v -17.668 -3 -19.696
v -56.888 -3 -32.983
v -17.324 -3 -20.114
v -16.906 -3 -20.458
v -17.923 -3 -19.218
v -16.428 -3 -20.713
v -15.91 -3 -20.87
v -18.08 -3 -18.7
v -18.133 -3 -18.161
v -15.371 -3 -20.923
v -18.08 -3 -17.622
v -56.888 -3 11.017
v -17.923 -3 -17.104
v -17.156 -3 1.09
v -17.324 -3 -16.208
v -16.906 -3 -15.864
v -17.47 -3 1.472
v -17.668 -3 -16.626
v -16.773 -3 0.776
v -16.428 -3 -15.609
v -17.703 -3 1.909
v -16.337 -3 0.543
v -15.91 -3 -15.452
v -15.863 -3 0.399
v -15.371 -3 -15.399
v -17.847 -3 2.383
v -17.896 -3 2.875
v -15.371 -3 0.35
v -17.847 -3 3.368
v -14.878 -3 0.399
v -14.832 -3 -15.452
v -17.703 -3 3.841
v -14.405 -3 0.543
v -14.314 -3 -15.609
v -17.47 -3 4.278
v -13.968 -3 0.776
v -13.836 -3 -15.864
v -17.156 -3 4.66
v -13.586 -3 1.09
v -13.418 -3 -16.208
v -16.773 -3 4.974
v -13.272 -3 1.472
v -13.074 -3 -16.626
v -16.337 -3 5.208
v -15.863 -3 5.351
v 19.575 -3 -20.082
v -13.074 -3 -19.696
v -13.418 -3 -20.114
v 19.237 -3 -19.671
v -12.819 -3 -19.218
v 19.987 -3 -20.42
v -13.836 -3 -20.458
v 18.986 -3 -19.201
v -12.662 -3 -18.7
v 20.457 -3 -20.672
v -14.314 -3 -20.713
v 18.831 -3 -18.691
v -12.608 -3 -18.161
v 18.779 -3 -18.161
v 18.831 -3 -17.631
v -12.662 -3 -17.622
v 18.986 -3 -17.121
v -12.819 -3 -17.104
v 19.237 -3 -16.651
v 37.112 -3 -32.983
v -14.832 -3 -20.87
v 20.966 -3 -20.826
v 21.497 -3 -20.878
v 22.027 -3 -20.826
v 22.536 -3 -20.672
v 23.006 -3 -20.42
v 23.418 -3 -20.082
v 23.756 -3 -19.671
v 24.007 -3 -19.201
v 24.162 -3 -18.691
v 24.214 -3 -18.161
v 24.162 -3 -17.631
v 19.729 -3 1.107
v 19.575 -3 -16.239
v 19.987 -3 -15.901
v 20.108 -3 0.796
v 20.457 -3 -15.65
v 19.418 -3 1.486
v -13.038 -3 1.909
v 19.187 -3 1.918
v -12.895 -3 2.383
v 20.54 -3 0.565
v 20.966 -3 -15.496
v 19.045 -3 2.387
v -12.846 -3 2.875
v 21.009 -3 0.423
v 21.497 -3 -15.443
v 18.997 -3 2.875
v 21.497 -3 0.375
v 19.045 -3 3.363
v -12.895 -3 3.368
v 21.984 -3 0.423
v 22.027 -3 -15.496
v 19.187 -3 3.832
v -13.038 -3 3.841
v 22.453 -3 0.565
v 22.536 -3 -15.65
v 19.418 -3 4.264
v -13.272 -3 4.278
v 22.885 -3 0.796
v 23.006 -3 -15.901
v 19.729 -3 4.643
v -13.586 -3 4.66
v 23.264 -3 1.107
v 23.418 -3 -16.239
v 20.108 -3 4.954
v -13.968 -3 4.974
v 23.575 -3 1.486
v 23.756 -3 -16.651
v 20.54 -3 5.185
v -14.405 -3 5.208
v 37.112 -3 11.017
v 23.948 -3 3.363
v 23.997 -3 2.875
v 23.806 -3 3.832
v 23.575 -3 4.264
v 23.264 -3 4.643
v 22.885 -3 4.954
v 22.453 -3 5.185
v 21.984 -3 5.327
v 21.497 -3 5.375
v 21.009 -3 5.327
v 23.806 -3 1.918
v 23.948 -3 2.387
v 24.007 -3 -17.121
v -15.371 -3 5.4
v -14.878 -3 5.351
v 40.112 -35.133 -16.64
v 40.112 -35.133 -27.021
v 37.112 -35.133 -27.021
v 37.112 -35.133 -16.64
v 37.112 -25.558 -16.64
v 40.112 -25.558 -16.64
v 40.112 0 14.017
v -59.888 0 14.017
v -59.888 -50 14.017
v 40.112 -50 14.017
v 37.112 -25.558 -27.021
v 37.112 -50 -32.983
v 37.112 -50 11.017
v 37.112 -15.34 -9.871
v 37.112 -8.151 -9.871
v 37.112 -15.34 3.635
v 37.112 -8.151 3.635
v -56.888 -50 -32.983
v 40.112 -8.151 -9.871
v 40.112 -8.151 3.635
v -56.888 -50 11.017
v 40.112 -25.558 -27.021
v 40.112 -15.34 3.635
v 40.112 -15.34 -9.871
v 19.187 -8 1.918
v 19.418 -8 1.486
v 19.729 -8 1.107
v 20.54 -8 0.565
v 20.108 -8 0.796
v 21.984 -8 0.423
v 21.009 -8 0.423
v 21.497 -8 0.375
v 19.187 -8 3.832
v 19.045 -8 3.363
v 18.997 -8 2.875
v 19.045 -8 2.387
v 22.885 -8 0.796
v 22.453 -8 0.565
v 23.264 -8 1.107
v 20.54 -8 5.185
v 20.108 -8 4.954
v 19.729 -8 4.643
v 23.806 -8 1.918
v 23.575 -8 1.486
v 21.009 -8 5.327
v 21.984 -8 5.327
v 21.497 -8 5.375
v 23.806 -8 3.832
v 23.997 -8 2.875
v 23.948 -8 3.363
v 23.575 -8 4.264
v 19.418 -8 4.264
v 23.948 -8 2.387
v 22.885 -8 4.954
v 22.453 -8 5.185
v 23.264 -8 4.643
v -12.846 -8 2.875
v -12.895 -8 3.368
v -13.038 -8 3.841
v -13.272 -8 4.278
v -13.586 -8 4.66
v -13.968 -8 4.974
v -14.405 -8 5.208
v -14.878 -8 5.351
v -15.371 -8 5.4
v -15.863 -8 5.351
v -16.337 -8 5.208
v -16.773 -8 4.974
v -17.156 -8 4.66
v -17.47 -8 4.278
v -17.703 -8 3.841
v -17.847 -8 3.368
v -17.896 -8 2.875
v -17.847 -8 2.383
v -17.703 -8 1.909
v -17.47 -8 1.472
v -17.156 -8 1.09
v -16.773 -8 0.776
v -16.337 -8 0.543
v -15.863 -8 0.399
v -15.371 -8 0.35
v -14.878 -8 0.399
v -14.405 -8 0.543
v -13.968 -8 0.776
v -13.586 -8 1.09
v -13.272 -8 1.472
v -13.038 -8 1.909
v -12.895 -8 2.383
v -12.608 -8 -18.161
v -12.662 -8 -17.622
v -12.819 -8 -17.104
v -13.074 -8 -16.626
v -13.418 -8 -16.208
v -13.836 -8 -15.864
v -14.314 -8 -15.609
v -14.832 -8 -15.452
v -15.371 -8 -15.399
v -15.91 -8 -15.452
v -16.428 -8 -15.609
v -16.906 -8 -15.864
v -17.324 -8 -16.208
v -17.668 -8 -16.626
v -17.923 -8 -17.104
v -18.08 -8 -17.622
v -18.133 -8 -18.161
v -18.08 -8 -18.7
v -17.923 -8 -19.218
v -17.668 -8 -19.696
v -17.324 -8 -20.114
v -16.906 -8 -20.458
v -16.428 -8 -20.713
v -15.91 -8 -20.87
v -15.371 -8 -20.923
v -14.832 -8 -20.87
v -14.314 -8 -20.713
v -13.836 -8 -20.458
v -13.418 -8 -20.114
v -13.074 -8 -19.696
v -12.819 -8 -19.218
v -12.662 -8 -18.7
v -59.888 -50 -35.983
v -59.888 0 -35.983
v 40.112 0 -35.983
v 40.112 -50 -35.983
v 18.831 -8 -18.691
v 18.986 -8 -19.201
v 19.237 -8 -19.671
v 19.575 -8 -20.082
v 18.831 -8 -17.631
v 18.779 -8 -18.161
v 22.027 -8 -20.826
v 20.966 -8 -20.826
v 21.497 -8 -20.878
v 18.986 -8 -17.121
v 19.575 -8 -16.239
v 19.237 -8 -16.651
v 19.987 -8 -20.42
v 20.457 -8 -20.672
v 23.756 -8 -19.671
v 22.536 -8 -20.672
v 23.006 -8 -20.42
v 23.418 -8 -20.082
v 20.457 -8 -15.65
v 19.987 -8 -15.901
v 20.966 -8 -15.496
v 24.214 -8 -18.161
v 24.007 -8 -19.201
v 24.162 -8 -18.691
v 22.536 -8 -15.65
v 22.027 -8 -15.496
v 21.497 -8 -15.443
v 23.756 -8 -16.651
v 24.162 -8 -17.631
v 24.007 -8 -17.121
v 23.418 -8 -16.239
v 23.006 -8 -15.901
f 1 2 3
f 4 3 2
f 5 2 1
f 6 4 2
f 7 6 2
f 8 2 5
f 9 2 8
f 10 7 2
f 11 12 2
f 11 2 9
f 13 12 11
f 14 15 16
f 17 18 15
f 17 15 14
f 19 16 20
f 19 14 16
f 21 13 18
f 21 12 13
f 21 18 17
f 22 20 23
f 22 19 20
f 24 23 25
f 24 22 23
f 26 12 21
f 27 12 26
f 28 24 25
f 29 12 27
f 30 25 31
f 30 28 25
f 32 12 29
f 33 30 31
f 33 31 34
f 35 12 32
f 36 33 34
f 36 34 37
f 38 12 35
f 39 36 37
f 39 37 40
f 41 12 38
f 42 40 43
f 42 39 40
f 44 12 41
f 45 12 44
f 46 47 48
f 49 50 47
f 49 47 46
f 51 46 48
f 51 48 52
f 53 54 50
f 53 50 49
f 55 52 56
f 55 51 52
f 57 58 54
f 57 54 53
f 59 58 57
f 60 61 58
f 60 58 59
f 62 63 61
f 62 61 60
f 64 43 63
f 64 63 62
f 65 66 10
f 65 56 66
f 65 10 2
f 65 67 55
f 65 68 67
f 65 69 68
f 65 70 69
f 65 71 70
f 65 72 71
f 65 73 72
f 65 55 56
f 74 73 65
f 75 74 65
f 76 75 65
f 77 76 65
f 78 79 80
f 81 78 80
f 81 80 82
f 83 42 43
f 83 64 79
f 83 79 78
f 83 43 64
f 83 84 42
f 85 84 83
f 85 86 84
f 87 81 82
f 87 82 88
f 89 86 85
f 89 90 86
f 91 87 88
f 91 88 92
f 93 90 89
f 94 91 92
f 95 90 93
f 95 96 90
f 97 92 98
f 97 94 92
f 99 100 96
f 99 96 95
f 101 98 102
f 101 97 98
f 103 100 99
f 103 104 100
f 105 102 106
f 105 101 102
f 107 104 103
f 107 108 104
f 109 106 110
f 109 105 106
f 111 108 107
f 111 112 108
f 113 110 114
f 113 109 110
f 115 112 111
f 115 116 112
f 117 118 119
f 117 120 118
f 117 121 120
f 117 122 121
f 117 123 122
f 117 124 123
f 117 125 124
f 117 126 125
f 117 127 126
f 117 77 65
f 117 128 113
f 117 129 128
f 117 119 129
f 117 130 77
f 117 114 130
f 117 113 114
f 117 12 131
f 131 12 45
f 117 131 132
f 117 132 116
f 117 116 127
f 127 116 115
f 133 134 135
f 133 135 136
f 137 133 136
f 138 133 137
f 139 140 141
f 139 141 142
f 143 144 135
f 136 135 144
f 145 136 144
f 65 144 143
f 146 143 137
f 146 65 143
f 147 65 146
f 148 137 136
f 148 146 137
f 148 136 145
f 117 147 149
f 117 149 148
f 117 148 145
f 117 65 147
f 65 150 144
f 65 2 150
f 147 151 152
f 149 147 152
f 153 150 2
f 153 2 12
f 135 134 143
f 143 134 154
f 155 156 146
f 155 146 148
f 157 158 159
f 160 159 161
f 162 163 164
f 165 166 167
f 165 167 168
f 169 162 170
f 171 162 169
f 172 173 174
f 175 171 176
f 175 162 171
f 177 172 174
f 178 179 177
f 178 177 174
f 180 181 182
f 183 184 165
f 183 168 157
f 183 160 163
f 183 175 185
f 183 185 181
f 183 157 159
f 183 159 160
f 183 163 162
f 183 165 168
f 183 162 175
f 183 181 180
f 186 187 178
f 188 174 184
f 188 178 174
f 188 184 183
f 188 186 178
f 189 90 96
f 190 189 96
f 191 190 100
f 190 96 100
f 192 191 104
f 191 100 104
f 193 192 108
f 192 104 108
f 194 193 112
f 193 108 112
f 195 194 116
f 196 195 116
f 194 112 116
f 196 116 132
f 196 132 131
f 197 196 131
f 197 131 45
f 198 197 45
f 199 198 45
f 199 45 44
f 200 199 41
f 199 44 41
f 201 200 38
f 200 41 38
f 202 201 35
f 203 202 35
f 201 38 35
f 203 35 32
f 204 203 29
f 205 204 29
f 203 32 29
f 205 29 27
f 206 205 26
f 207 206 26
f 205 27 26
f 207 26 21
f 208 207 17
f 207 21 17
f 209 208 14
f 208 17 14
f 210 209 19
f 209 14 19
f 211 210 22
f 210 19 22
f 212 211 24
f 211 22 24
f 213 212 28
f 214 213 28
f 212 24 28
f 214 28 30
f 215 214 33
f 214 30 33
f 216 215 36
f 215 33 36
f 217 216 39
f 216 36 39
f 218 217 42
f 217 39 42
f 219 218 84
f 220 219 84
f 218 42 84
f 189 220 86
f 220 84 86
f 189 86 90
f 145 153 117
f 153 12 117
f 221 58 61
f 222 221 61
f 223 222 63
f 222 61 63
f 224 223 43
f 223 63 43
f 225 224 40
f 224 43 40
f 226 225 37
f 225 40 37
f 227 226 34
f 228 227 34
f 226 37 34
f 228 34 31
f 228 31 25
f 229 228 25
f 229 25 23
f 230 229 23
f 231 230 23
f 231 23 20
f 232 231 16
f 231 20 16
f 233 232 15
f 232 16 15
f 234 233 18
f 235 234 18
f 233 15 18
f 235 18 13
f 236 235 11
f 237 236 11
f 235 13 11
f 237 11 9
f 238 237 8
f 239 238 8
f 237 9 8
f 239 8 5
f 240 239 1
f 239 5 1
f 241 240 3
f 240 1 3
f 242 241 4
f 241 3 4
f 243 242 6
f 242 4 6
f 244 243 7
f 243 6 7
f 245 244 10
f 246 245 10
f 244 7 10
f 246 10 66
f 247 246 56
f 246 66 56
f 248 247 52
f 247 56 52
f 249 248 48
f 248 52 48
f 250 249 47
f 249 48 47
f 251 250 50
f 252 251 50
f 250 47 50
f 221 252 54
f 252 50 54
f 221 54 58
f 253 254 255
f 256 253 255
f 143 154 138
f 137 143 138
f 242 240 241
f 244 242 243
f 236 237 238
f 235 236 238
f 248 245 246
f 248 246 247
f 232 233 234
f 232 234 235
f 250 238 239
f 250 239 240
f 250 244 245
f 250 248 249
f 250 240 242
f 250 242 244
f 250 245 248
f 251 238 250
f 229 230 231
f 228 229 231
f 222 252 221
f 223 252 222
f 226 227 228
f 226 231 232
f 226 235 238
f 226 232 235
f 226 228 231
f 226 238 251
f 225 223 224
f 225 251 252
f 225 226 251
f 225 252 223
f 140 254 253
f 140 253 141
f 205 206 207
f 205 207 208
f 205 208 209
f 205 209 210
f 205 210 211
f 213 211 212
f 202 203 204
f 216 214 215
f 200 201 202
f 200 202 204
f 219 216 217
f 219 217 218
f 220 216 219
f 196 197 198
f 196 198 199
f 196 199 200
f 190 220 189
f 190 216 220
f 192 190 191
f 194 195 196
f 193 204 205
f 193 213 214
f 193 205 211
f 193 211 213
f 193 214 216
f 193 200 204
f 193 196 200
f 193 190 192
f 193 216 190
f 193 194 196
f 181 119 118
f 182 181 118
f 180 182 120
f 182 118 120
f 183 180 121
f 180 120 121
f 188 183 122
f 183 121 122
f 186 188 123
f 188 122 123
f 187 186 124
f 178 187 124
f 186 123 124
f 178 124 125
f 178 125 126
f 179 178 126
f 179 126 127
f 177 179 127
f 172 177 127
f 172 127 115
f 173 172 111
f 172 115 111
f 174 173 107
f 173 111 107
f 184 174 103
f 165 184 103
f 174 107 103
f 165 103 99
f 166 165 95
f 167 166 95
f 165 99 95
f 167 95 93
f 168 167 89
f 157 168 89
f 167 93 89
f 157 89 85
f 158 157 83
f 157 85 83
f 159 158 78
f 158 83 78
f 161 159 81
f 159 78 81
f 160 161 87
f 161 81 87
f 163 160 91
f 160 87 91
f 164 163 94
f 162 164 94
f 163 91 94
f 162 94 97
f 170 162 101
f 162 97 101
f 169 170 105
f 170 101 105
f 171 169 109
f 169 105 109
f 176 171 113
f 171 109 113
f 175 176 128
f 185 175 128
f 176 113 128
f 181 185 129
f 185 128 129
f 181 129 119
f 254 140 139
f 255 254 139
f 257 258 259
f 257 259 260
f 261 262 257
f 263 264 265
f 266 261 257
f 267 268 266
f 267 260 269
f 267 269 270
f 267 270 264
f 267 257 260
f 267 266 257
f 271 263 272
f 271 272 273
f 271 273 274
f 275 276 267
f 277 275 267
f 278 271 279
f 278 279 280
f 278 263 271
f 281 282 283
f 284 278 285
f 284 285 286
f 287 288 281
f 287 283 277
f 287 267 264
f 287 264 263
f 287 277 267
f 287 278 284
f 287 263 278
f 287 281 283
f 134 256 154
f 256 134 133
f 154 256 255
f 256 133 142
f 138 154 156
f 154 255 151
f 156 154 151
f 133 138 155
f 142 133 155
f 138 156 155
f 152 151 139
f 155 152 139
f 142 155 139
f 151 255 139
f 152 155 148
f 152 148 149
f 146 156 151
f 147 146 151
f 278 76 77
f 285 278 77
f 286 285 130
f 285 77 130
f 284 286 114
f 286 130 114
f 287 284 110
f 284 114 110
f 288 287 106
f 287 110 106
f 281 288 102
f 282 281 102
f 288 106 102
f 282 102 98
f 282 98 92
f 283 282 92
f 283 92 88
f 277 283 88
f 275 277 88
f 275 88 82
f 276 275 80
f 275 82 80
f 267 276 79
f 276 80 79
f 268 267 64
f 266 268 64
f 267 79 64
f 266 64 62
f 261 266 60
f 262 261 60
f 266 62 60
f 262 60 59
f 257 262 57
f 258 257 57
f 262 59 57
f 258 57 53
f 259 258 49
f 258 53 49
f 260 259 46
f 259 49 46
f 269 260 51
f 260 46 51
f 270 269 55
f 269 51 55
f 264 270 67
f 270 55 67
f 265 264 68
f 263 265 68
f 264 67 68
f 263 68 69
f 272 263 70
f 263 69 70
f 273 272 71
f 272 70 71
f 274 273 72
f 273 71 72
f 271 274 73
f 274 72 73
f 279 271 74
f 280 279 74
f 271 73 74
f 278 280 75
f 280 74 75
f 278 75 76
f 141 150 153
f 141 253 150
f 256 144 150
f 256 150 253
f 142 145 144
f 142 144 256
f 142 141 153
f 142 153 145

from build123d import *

# Parameters (mm, degrees)
F0_W      = 100
F0_H      = 50
F1_DEPTH  = 50
F2_T      = -3
F3_W      = 7.189277
F3_H      = 13.505568
F4_DEPTH  = 3
F3_W_2    = 9.575039
F3_H_2    = 10.380805
F5_DEPTH  = 3
F6_R      = 2.5
F7_DEPTH  = 5
F6_R_2    = 2.717487
F8_DEPTH  = 5
F6_R_3    = 2.762406
F9_DEPTH  = 5
F6_R_4    = 2.52466
F10_DEPTH = 5


with BuildPart() as f1:
    # F0 (on Front) → F1 (new body)
    with BuildSketch(Plane.XZ):
        with Locations((-9.887868, -10.982526)):
            Rectangle(F0_W, F0_H)
    extrude(amount=F1_DEPTH)

    # F2
    f2_openings = [f1.faces().sort_by_distance(p)[0] for p in [
        (-9.887868, -50, -10.982526),
    ]]
    offset(amount=F2_T, openings=f2_openings)

    # F3 (on face) → F4 (cut)
    with BuildSketch(Plane.YZ.offset(40.112132)):
        with Locations((-11.745577, -3.117744)):
            Rectangle(F3_W, F3_H)
    extrude(amount=-F4_DEPTH, mode=Mode.SUBTRACT)

    # F3 (on face) → F5 (cut)
    with BuildSketch(Plane.YZ.offset(40.112132)):
        with Locations((-30.345603, -21.830169)):
            Rectangle(F3_W_2, F3_H_2)
    extrude(amount=-F5_DEPTH, mode=Mode.SUBTRACT)

    # F6 (on face) → F7 (join)
    with BuildSketch(Plane.XZ.offset(3)):
        with Locations((21.496529, 2.875064)):
            Circle(F6_R)
    extrude(amount=F7_DEPTH)

    # F6 (on face) → F8 (join)
    with BuildSketch(Plane.XZ.offset(3)):
        with Locations((21.496529, -18.16091)):
            Circle(F6_R_2)
    extrude(amount=F8_DEPTH)

    # F6 (on face) → F9 (join)
    with BuildSketch(Plane.XZ.offset(3)):
        with Locations((-15.370856, -18.16091)):
            Circle(F6_R_3)
    extrude(amount=F9_DEPTH)

    # F6 (on face) → F10 (join)
    with BuildSketch(Plane.XZ.offset(3)):
        with Locations((-15.370856, 2.875064)):
            Circle(F6_R_4)
    extrude(amount=F10_DEPTH)


solid = f1.part
